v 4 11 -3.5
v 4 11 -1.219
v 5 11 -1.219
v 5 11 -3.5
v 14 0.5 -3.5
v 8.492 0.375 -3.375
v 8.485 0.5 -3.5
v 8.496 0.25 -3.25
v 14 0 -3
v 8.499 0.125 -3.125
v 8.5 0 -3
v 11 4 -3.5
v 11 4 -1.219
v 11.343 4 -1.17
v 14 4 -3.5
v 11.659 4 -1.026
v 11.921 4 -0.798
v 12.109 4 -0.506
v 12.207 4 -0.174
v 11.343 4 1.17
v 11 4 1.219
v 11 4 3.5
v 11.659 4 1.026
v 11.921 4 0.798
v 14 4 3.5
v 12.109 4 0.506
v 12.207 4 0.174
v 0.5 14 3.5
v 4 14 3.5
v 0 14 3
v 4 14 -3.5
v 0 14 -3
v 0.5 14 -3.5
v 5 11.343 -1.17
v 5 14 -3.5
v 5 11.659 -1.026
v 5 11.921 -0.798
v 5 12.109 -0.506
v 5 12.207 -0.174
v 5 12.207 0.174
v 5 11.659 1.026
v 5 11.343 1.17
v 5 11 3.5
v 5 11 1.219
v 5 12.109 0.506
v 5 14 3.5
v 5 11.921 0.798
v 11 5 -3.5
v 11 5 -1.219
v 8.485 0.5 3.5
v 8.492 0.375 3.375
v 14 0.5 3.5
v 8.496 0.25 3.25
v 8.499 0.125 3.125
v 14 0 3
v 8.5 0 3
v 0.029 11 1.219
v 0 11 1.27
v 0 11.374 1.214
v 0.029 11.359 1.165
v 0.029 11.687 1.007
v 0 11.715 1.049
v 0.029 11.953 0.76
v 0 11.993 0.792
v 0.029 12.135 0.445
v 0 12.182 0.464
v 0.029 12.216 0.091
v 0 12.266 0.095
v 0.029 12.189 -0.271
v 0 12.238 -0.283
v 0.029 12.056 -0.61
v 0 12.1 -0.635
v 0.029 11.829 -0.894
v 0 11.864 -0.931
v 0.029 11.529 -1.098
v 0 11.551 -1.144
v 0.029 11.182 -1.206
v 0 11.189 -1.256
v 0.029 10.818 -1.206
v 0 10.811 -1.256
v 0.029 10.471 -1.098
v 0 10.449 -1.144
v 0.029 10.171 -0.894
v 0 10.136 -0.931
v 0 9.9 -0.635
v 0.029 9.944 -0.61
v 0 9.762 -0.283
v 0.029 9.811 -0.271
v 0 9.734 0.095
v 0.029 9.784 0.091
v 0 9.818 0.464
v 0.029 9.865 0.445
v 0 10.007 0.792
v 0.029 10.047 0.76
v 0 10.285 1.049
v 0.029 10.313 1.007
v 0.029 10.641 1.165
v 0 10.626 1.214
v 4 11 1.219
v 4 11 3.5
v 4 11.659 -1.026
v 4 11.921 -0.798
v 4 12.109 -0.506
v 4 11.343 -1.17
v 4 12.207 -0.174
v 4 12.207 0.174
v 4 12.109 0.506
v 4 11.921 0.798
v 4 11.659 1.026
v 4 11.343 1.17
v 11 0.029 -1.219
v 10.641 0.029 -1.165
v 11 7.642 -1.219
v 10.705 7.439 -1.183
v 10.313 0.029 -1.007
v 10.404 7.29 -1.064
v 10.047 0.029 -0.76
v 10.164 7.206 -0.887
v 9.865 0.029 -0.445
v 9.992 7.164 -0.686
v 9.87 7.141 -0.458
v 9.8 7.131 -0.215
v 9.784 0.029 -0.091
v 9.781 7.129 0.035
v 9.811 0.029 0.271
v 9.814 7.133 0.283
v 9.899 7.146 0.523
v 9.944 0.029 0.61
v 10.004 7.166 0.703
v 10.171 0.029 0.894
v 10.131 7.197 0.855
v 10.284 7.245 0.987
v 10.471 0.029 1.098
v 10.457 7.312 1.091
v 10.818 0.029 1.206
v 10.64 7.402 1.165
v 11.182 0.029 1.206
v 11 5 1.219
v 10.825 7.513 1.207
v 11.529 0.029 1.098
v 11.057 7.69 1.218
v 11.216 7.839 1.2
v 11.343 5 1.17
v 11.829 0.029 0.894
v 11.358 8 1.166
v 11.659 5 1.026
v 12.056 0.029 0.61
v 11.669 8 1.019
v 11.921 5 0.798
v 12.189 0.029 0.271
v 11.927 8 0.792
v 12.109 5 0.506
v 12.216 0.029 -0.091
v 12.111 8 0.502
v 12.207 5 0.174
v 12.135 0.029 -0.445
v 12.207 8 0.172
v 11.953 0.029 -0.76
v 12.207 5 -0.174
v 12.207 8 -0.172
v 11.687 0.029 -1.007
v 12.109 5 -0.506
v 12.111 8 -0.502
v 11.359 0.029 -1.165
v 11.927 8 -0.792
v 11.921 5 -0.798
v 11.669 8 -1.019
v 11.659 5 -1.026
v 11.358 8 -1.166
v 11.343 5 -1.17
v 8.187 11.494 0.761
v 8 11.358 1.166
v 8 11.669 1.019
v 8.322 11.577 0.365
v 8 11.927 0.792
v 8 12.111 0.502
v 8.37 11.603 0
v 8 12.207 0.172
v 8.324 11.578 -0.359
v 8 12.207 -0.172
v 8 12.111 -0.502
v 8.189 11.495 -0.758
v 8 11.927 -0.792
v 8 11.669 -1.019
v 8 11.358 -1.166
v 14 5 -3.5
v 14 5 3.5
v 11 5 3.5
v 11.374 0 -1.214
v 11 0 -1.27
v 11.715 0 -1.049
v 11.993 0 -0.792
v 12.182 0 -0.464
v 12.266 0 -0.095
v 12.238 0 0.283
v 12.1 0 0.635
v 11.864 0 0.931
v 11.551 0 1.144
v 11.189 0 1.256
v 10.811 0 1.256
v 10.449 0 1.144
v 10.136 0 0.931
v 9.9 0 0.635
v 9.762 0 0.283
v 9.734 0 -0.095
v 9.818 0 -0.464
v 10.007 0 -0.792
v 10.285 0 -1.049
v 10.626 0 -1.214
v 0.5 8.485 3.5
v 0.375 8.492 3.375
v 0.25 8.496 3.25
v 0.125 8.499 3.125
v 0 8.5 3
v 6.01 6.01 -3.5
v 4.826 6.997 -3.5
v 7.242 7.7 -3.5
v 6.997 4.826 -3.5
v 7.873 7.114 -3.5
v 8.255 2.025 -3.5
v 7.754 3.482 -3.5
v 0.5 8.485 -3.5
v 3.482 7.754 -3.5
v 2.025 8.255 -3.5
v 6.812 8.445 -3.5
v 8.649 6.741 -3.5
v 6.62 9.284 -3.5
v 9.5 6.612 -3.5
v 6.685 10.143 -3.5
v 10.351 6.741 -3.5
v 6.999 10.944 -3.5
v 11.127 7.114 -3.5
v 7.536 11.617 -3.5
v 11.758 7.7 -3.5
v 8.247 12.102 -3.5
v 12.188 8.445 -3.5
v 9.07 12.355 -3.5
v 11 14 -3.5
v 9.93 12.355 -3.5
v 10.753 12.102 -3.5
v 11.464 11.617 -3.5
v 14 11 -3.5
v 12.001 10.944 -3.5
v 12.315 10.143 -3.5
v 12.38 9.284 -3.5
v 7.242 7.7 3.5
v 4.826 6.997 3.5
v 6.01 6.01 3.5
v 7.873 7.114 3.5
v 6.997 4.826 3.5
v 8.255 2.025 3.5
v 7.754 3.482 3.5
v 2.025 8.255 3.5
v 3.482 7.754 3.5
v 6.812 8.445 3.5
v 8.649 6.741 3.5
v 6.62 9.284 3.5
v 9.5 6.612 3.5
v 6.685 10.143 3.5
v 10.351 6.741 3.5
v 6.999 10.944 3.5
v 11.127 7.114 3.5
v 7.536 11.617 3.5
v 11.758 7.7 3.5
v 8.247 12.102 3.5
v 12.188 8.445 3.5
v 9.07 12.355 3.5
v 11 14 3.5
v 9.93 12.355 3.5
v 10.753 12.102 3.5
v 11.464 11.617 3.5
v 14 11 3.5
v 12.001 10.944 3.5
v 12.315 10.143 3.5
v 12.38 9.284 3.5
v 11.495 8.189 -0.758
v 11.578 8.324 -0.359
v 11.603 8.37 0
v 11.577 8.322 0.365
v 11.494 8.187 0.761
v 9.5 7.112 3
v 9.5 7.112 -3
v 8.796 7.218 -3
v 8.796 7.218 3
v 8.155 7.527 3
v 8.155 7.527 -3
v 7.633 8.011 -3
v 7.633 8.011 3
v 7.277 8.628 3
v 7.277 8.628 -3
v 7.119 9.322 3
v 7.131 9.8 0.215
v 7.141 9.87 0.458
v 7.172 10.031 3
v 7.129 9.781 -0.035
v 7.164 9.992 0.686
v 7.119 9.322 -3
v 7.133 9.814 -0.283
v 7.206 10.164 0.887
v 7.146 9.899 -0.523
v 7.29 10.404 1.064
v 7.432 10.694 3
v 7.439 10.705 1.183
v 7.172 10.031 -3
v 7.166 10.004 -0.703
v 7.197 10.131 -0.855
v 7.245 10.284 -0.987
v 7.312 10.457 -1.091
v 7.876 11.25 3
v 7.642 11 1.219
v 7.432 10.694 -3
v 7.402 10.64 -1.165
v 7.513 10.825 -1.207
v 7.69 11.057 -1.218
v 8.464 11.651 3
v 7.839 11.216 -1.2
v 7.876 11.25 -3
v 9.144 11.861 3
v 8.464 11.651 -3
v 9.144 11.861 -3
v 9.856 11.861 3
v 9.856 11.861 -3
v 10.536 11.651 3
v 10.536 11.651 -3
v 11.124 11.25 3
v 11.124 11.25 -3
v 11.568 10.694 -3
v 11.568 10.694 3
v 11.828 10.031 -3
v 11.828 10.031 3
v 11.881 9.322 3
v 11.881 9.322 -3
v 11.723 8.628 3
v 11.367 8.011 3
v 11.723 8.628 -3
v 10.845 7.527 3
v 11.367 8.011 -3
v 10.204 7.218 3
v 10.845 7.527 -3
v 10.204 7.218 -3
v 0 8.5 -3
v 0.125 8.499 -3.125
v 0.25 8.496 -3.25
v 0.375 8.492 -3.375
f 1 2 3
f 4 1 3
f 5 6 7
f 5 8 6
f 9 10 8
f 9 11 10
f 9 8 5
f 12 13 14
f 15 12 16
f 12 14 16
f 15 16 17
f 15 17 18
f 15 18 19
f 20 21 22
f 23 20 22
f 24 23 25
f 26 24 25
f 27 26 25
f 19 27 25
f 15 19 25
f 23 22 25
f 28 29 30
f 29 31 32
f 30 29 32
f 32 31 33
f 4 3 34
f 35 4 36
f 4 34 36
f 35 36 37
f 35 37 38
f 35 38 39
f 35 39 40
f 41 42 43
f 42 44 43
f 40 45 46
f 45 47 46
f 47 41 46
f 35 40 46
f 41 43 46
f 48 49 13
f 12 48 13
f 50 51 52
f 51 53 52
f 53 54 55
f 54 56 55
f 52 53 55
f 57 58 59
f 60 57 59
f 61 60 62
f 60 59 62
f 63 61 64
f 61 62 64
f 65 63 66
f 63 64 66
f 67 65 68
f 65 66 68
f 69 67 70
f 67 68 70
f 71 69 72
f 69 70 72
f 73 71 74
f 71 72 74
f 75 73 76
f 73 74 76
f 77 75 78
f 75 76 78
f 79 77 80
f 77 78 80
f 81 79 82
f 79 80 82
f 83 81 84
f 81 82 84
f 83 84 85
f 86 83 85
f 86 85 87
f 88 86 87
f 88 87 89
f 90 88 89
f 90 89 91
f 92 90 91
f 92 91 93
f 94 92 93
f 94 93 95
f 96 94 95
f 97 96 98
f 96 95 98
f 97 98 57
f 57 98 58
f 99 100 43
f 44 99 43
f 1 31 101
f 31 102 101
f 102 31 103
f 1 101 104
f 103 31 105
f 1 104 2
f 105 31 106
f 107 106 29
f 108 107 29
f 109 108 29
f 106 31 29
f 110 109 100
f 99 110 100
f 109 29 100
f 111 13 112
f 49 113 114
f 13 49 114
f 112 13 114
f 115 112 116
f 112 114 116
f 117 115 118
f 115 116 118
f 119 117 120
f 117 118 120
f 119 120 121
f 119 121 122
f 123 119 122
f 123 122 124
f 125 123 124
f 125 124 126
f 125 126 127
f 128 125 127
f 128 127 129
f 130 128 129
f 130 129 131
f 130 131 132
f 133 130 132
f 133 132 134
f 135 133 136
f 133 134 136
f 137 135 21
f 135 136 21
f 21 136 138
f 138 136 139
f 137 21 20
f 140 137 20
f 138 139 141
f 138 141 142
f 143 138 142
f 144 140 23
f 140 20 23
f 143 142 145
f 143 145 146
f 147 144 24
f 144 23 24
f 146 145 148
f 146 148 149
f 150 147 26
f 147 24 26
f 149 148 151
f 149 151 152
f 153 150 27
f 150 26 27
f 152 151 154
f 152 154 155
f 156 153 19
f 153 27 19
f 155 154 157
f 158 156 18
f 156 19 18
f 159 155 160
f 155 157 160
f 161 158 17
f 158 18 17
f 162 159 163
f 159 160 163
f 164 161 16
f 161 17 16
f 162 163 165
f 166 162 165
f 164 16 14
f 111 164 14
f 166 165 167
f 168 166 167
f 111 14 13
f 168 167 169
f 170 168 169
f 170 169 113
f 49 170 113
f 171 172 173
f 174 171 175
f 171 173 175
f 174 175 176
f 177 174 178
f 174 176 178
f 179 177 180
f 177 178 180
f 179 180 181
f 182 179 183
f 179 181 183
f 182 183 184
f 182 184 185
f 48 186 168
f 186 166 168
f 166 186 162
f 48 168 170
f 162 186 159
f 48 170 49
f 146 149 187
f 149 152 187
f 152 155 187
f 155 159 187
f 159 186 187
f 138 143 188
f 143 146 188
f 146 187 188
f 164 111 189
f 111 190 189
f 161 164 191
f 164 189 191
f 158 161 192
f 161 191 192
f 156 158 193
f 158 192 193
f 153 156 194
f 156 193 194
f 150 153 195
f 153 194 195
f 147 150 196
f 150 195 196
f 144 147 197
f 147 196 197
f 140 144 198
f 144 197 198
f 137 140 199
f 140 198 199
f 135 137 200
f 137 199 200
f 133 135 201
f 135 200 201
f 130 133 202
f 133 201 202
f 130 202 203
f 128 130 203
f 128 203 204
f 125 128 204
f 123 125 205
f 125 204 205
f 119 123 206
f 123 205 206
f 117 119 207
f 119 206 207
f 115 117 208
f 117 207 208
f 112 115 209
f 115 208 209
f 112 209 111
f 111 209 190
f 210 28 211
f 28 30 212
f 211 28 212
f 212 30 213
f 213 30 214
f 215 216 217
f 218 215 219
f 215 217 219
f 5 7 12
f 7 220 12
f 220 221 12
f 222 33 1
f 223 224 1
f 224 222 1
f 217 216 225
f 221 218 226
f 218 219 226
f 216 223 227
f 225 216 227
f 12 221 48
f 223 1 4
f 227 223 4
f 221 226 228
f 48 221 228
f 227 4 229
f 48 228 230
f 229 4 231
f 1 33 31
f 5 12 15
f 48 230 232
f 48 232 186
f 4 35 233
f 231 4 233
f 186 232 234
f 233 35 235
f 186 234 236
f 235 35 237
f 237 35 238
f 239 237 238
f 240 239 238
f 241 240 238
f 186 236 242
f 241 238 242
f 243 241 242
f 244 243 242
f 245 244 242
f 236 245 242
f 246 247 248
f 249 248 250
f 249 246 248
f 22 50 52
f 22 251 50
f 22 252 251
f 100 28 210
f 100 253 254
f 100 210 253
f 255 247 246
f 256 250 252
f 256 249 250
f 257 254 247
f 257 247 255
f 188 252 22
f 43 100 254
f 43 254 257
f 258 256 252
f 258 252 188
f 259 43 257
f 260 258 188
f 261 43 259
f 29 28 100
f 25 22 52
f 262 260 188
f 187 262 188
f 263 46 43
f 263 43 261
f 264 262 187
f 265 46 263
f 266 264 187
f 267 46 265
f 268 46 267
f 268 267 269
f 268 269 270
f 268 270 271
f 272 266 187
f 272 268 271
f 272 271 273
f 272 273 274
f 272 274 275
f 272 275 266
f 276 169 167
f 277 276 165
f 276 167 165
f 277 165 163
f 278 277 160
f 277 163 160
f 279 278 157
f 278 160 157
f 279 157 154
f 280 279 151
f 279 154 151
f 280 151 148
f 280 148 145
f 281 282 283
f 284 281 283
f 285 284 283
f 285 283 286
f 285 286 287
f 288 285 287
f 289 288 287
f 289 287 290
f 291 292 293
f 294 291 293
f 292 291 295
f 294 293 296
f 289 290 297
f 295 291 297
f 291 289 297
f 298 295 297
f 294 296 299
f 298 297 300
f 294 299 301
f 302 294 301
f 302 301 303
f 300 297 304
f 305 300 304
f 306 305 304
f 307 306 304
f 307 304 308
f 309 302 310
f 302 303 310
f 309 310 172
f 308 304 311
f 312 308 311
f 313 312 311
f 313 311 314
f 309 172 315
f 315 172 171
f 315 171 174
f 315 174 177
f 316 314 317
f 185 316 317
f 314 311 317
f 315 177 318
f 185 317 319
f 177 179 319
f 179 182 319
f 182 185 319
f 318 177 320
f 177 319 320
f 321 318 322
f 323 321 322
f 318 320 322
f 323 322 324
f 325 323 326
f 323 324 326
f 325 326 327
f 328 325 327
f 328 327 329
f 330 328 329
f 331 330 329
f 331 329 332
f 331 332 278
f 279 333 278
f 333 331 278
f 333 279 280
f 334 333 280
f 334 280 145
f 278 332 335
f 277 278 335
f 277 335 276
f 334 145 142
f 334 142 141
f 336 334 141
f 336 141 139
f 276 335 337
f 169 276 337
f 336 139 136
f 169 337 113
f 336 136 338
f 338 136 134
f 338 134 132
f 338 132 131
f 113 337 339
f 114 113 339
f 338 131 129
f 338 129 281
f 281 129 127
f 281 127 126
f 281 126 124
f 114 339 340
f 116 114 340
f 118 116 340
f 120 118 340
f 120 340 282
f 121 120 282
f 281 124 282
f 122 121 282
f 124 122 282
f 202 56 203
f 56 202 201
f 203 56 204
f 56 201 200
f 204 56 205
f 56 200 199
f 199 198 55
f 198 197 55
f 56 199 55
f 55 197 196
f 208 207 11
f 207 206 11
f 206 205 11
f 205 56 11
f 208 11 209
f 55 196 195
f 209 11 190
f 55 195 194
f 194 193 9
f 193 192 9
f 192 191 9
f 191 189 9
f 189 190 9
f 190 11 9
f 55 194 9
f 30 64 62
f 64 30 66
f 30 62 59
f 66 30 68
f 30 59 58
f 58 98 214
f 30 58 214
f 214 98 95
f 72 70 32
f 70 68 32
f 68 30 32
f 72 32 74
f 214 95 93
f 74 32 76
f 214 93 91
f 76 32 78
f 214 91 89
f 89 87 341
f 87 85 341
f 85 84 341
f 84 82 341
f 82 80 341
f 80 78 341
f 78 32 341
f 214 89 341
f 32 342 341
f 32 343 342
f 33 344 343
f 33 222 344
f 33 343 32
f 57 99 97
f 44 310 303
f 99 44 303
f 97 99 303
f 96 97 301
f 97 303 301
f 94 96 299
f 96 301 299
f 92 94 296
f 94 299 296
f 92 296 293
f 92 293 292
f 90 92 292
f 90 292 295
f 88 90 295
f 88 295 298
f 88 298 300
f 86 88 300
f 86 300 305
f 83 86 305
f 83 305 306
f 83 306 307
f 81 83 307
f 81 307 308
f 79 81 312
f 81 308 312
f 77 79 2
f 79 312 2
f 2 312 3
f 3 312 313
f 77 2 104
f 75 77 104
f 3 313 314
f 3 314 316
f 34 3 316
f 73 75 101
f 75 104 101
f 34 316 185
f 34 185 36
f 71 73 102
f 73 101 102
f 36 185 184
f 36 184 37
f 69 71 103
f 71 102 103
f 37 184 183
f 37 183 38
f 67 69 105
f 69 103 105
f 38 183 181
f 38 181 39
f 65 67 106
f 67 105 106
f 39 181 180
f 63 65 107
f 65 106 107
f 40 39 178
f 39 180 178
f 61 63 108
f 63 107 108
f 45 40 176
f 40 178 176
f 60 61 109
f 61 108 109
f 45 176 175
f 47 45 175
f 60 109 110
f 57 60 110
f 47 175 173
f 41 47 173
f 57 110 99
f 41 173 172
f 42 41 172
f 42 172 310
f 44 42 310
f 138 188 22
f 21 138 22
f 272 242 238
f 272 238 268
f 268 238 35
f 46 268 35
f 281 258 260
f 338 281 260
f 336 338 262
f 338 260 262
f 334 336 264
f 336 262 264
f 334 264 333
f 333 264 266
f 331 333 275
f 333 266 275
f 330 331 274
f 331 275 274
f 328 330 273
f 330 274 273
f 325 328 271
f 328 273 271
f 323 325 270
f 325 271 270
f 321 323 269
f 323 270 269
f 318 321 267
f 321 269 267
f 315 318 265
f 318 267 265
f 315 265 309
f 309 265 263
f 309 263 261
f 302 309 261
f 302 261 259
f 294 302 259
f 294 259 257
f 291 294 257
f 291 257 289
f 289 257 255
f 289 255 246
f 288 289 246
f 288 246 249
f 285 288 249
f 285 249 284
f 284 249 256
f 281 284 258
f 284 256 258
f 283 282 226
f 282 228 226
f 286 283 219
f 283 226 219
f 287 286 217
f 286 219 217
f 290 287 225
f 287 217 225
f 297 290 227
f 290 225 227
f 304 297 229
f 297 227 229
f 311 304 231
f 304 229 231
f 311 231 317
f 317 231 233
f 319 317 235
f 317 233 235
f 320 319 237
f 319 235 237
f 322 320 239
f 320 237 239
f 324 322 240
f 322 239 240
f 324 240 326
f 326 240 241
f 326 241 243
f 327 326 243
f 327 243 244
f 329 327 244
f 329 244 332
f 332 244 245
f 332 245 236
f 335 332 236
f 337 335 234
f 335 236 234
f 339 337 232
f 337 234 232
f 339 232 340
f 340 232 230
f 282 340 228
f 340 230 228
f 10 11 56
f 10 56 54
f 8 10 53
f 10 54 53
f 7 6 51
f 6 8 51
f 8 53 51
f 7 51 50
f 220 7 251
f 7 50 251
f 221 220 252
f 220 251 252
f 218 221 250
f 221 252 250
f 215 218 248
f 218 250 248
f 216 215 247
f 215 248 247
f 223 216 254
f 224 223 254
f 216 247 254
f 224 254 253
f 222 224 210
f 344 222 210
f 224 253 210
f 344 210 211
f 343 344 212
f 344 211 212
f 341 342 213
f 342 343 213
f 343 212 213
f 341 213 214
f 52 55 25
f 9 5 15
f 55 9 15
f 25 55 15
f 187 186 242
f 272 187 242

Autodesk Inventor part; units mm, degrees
ref_plane "YZ Plane" through (0, 0, 0) normal (1, 0, 0) x (0, 1, 0)
ref_plane "XZ Plane" through (0, 0, 0) normal (0, 1, 0) x (-1, 0, 0)
ref_plane "XY Plane" through (0, 0, 0) normal (0, 0, 1) x (1, 0, 0)
sketch "Sketch1" plane through (0, 0, 0) normal (0, 0, 1) x (1, 0, 0)
  line L0 (0, 0) -> (14, 0)
  line L1 (14, 0) -> (14, 14)
  line L2 (14, 14) -> (0, 14)
  line L3 (0, 14) -> (0, 0)
  dimension "d0" = 14
  dimension "d1" = 14
extrude "Extrusion1" add sketch "Sketch1" along normal mid plane 7
hole "Hole1" at (9.5, 9.5, 3.5) direction (0, 0, -1) diameter 4.7752 end through all
sketch "Sketch22" plane through (0, 0, 3.5) normal (0, 0, 1) x (1, 0, 0)
  line L0 (0, 0) -> (0, 14) projected
  line L1 (14, 0) -> (0, 0) projected
  arc A0 (8.5, 0) -> (0, 8.5) centre (0, 0) ccw
  line L2 (0, 8.5) -> (0, 0)
  line L3 (0, 0) -> (8.5, 0)
  dimension "d145" = 8.5
extrude "Extrusion19" cut sketch "Sketch22" against normal through all
sketch "Sketch15" plane through (0, 0, 3.5) normal (0, 0, 1) x (1, 0, 0)
  line L0 (14, 0) -> (0, 0) projected
  line L1 (0, 0) -> (0, 14) projected
  line L2 (5, 5) -> (5, 12)
  line L3 (5, 12) -> (4, 12)
  line L4 (4, 12) -> (4, 5)
  line L5 (5, 4) -> (12, 4)
  line L6 (12, 4) -> (12, 5)
  line L7 (12, 5) -> (5, 5)
  arc A0 (8.5, 0) -> (0, 8.5) centre (0, 0) ccw projected
  line L8 (4, 5) -> (0, 5)
  line L9 (0, 5) -> (0, 0)
  line L10 (0, 0) -> (5, 0)
  line L11 (5, 0) -> (5, 4)
  point P0 (0, 7.5)
  point P1 (7.5, 0)
  point P2 (5.3543, 6.6016)
  dimension "d94" = 1
  dimension "d95" = 4
  dimension "d96" = 4
  dimension "d97" = 12
extrude "sawblade" [suppressed]
chamfer "Chamfer5" distance 3 angle 45 1 edges at (14, 14, 0)
chamfer "Chamfer8" distance 0.5 angle 45 4 edges at (11.25, 0, 3.5) (0, 11.25, 3.5) (11.25, 0, -3.5) (0, 11.25, -3.5)
chamfer "Chamfer9" distance 0.5 angle 45 2 edges at (9.5, 11.8876, 3.5) (9.5, 11.8876, -3.5)
hole "Hole6" at (11, 0, 0) direction (0, 1, 0) diameter 2.4384 depth 8 tip angle 118 countersink diameter 2.54 countersink angle 120
hole "Hole7" at (0, 11, 0) direction (1, 0, 0) diameter 2.4384 depth 8 tip angle 118 countersink diameter 2.54 countersink angle 120
sketch "Sketch25" plane through (0, 0, 3.5) normal (0, 0, 1) x (1, 0, 0)
  line L0 (0.5, 14) -> (11, 14) projected
  line L1 (5, 14) -> (4, 14)
  line L2 (4, 14) -> (4, 11)
  line L3 (4, 11) -> (5, 11)
  line L4 (5, 11) -> (5, 14)
  line L5 (0, 14) -> (0, 8.5) projected
  dimension "d183" = 3
  dimension "d184" = 4
  dimension "d185" = 1
extrude "sawblade1" cut sketch "Sketch25" against normal through all
sketch "Sketch26" plane through (0, 0, 3.5) normal (0, 0, 1) x (1, 0, 0)
  line L0 (14, 5) -> (11, 5)
  line L1 (11, 5) -> (11, 4)
  line L2 (11, 4) -> (14, 4)
  line L3 (14, 4) -> (14, 5)
  line L4 (8.5, 0) -> (14, 0) projected
  dimension "d188" = 4
  dimension "d189" = 1
  dimension "d190" = 3
extrude "sawblade2" cut sketch "Sketch26" against normal through all
hole "Hole8" [suppressed]
hole "Hole9" [suppressed]
properties part number "FOX-ME-118-01" material "Delrin, Black"
